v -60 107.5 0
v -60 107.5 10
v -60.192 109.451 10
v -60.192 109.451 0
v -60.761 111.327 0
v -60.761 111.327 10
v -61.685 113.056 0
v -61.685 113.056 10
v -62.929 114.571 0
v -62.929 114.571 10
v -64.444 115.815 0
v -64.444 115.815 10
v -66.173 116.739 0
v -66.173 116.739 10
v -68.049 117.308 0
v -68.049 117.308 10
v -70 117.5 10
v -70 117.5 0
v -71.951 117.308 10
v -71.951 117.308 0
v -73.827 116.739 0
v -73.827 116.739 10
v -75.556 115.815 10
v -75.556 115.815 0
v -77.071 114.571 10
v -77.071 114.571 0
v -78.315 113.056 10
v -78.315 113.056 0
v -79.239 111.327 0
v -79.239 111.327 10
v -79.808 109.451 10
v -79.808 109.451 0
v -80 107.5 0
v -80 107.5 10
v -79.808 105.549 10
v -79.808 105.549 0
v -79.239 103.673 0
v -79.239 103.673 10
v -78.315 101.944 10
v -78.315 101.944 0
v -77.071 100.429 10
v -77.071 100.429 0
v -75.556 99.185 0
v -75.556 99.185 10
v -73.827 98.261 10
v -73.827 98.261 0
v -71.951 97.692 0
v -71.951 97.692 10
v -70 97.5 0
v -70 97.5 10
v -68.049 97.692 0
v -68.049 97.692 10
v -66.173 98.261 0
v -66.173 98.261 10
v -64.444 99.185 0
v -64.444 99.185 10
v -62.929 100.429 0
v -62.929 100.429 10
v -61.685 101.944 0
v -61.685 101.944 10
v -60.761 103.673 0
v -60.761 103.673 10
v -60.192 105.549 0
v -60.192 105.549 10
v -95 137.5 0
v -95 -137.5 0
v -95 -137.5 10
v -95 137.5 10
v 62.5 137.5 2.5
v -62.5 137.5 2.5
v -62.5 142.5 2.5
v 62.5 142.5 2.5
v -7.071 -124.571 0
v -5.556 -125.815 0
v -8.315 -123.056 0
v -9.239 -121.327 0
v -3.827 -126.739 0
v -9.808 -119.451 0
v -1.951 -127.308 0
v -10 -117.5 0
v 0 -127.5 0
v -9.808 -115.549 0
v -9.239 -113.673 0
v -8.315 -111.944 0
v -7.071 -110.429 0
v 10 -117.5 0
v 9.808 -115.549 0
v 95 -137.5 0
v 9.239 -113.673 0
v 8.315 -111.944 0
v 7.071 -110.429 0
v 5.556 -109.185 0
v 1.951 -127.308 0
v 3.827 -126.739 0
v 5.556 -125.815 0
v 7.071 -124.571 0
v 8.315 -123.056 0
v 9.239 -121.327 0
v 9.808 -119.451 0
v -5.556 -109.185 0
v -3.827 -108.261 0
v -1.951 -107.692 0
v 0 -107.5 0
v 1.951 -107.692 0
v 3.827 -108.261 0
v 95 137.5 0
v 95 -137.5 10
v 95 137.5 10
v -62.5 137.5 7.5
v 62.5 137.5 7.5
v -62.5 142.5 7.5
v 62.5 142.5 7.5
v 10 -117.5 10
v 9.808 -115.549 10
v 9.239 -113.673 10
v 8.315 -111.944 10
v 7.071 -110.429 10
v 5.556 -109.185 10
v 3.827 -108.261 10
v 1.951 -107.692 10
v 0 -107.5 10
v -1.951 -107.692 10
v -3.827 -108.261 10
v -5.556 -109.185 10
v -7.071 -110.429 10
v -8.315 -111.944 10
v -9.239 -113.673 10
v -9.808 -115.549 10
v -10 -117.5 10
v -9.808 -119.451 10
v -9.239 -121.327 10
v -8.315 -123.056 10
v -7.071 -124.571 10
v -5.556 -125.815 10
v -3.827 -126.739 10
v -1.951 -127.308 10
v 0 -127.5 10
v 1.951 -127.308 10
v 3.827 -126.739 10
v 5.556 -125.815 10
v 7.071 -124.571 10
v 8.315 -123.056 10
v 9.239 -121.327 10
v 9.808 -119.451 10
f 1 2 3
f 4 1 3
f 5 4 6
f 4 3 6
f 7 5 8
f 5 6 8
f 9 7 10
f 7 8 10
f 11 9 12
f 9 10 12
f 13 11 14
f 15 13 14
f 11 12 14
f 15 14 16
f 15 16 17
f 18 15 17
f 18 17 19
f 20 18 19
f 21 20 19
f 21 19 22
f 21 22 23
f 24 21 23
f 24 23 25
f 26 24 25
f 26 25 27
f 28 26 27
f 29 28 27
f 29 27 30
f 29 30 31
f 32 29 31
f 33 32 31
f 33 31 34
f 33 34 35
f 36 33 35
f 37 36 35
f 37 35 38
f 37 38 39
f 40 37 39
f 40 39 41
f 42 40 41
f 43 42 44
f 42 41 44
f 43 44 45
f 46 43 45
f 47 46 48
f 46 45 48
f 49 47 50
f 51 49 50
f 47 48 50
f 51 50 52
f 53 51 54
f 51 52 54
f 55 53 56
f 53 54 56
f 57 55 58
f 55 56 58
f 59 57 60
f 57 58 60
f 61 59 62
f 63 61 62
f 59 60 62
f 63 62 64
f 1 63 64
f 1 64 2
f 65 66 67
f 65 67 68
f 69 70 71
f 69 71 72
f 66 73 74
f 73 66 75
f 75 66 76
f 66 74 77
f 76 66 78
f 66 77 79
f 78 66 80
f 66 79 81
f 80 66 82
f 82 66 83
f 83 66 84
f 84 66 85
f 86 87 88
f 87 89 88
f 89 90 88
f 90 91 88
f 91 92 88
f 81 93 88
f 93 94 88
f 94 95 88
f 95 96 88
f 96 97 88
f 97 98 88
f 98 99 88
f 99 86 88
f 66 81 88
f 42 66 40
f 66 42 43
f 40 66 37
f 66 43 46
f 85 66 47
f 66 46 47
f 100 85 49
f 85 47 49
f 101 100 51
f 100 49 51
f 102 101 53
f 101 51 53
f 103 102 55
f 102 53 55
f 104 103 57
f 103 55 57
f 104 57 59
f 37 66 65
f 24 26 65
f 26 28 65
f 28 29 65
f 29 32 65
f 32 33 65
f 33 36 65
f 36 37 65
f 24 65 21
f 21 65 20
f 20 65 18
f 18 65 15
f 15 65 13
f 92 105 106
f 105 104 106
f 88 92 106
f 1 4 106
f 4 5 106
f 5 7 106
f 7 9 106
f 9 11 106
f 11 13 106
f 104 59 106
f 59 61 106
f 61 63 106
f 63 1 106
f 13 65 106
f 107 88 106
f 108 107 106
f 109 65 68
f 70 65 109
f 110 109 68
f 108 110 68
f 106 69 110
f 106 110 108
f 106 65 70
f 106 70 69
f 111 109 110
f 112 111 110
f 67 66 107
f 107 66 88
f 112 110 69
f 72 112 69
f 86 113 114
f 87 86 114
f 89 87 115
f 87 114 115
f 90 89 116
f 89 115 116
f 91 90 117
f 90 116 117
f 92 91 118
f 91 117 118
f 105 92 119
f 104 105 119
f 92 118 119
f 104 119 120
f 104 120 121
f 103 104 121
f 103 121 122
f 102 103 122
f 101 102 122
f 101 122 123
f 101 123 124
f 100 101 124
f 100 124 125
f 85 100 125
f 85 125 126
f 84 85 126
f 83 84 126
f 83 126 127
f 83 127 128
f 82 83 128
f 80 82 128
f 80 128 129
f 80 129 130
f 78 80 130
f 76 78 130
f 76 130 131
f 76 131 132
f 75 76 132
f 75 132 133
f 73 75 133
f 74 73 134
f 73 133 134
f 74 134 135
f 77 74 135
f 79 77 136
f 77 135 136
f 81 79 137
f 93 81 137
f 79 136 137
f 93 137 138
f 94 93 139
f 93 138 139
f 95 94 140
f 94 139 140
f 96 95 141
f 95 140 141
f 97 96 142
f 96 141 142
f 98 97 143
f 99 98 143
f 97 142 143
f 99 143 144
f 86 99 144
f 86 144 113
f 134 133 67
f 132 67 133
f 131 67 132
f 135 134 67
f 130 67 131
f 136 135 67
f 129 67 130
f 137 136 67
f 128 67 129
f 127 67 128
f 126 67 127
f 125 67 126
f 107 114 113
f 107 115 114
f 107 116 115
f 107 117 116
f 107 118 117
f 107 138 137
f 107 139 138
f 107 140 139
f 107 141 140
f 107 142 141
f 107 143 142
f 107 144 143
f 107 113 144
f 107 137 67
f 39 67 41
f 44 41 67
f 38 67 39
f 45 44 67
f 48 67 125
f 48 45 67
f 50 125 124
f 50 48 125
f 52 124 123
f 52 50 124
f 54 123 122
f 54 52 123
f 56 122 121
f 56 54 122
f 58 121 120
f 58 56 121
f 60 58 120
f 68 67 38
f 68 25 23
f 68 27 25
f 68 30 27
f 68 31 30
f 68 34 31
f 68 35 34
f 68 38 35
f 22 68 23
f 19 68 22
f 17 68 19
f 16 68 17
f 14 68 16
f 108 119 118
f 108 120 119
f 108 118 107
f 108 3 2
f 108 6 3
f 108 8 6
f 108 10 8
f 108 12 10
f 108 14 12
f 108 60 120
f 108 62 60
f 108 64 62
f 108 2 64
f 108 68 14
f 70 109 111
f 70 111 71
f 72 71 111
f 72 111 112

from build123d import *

# Parameters (mm, degrees)
SKETCH1_W           = 190
SKETCH1_H           = 275
BOSS_EXTRUDE1_DEPTH = 10
SKETCH2_W           = 125
SKETCH2_H           = 5
BOSS_EXTRUDE2_DEPTH = 5
SKETCH3_R           = 10
CUT_EXTRUDE1_DEPTH  = 16


with BuildPart() as part:
    # Sketch1 → Boss-Extrude1 (new body)
    with BuildSketch(Plane.XY):
        Rectangle(SKETCH1_W, SKETCH1_H)
    extrude(amount=BOSS_EXTRUDE1_DEPTH)

    # Sketch2 → Boss-Extrude2 (add)
    with BuildSketch(Plane(origin=(0, 137.5, 0), x_dir=(1, 0, 0), z_dir=(0, 1, 0))):
        with Locations((0, -5)):
            Rectangle(SKETCH2_W, SKETCH2_H)
    extrude(amount=BOSS_EXTRUDE2_DEPTH)

    # Sketch3 → Cut-Extrude1 (cut)
    with BuildSketch(Plane.XY.offset(10)):
        with Locations((0, -117.5)):
            Circle(SKETCH3_R)
        with Locations((-70, 107.5)):
            Circle(SKETCH3_R)
    extrude(amount=-CUT_EXTRUDE1_DEPTH, mode=Mode.SUBTRACT)


solid = part.part
